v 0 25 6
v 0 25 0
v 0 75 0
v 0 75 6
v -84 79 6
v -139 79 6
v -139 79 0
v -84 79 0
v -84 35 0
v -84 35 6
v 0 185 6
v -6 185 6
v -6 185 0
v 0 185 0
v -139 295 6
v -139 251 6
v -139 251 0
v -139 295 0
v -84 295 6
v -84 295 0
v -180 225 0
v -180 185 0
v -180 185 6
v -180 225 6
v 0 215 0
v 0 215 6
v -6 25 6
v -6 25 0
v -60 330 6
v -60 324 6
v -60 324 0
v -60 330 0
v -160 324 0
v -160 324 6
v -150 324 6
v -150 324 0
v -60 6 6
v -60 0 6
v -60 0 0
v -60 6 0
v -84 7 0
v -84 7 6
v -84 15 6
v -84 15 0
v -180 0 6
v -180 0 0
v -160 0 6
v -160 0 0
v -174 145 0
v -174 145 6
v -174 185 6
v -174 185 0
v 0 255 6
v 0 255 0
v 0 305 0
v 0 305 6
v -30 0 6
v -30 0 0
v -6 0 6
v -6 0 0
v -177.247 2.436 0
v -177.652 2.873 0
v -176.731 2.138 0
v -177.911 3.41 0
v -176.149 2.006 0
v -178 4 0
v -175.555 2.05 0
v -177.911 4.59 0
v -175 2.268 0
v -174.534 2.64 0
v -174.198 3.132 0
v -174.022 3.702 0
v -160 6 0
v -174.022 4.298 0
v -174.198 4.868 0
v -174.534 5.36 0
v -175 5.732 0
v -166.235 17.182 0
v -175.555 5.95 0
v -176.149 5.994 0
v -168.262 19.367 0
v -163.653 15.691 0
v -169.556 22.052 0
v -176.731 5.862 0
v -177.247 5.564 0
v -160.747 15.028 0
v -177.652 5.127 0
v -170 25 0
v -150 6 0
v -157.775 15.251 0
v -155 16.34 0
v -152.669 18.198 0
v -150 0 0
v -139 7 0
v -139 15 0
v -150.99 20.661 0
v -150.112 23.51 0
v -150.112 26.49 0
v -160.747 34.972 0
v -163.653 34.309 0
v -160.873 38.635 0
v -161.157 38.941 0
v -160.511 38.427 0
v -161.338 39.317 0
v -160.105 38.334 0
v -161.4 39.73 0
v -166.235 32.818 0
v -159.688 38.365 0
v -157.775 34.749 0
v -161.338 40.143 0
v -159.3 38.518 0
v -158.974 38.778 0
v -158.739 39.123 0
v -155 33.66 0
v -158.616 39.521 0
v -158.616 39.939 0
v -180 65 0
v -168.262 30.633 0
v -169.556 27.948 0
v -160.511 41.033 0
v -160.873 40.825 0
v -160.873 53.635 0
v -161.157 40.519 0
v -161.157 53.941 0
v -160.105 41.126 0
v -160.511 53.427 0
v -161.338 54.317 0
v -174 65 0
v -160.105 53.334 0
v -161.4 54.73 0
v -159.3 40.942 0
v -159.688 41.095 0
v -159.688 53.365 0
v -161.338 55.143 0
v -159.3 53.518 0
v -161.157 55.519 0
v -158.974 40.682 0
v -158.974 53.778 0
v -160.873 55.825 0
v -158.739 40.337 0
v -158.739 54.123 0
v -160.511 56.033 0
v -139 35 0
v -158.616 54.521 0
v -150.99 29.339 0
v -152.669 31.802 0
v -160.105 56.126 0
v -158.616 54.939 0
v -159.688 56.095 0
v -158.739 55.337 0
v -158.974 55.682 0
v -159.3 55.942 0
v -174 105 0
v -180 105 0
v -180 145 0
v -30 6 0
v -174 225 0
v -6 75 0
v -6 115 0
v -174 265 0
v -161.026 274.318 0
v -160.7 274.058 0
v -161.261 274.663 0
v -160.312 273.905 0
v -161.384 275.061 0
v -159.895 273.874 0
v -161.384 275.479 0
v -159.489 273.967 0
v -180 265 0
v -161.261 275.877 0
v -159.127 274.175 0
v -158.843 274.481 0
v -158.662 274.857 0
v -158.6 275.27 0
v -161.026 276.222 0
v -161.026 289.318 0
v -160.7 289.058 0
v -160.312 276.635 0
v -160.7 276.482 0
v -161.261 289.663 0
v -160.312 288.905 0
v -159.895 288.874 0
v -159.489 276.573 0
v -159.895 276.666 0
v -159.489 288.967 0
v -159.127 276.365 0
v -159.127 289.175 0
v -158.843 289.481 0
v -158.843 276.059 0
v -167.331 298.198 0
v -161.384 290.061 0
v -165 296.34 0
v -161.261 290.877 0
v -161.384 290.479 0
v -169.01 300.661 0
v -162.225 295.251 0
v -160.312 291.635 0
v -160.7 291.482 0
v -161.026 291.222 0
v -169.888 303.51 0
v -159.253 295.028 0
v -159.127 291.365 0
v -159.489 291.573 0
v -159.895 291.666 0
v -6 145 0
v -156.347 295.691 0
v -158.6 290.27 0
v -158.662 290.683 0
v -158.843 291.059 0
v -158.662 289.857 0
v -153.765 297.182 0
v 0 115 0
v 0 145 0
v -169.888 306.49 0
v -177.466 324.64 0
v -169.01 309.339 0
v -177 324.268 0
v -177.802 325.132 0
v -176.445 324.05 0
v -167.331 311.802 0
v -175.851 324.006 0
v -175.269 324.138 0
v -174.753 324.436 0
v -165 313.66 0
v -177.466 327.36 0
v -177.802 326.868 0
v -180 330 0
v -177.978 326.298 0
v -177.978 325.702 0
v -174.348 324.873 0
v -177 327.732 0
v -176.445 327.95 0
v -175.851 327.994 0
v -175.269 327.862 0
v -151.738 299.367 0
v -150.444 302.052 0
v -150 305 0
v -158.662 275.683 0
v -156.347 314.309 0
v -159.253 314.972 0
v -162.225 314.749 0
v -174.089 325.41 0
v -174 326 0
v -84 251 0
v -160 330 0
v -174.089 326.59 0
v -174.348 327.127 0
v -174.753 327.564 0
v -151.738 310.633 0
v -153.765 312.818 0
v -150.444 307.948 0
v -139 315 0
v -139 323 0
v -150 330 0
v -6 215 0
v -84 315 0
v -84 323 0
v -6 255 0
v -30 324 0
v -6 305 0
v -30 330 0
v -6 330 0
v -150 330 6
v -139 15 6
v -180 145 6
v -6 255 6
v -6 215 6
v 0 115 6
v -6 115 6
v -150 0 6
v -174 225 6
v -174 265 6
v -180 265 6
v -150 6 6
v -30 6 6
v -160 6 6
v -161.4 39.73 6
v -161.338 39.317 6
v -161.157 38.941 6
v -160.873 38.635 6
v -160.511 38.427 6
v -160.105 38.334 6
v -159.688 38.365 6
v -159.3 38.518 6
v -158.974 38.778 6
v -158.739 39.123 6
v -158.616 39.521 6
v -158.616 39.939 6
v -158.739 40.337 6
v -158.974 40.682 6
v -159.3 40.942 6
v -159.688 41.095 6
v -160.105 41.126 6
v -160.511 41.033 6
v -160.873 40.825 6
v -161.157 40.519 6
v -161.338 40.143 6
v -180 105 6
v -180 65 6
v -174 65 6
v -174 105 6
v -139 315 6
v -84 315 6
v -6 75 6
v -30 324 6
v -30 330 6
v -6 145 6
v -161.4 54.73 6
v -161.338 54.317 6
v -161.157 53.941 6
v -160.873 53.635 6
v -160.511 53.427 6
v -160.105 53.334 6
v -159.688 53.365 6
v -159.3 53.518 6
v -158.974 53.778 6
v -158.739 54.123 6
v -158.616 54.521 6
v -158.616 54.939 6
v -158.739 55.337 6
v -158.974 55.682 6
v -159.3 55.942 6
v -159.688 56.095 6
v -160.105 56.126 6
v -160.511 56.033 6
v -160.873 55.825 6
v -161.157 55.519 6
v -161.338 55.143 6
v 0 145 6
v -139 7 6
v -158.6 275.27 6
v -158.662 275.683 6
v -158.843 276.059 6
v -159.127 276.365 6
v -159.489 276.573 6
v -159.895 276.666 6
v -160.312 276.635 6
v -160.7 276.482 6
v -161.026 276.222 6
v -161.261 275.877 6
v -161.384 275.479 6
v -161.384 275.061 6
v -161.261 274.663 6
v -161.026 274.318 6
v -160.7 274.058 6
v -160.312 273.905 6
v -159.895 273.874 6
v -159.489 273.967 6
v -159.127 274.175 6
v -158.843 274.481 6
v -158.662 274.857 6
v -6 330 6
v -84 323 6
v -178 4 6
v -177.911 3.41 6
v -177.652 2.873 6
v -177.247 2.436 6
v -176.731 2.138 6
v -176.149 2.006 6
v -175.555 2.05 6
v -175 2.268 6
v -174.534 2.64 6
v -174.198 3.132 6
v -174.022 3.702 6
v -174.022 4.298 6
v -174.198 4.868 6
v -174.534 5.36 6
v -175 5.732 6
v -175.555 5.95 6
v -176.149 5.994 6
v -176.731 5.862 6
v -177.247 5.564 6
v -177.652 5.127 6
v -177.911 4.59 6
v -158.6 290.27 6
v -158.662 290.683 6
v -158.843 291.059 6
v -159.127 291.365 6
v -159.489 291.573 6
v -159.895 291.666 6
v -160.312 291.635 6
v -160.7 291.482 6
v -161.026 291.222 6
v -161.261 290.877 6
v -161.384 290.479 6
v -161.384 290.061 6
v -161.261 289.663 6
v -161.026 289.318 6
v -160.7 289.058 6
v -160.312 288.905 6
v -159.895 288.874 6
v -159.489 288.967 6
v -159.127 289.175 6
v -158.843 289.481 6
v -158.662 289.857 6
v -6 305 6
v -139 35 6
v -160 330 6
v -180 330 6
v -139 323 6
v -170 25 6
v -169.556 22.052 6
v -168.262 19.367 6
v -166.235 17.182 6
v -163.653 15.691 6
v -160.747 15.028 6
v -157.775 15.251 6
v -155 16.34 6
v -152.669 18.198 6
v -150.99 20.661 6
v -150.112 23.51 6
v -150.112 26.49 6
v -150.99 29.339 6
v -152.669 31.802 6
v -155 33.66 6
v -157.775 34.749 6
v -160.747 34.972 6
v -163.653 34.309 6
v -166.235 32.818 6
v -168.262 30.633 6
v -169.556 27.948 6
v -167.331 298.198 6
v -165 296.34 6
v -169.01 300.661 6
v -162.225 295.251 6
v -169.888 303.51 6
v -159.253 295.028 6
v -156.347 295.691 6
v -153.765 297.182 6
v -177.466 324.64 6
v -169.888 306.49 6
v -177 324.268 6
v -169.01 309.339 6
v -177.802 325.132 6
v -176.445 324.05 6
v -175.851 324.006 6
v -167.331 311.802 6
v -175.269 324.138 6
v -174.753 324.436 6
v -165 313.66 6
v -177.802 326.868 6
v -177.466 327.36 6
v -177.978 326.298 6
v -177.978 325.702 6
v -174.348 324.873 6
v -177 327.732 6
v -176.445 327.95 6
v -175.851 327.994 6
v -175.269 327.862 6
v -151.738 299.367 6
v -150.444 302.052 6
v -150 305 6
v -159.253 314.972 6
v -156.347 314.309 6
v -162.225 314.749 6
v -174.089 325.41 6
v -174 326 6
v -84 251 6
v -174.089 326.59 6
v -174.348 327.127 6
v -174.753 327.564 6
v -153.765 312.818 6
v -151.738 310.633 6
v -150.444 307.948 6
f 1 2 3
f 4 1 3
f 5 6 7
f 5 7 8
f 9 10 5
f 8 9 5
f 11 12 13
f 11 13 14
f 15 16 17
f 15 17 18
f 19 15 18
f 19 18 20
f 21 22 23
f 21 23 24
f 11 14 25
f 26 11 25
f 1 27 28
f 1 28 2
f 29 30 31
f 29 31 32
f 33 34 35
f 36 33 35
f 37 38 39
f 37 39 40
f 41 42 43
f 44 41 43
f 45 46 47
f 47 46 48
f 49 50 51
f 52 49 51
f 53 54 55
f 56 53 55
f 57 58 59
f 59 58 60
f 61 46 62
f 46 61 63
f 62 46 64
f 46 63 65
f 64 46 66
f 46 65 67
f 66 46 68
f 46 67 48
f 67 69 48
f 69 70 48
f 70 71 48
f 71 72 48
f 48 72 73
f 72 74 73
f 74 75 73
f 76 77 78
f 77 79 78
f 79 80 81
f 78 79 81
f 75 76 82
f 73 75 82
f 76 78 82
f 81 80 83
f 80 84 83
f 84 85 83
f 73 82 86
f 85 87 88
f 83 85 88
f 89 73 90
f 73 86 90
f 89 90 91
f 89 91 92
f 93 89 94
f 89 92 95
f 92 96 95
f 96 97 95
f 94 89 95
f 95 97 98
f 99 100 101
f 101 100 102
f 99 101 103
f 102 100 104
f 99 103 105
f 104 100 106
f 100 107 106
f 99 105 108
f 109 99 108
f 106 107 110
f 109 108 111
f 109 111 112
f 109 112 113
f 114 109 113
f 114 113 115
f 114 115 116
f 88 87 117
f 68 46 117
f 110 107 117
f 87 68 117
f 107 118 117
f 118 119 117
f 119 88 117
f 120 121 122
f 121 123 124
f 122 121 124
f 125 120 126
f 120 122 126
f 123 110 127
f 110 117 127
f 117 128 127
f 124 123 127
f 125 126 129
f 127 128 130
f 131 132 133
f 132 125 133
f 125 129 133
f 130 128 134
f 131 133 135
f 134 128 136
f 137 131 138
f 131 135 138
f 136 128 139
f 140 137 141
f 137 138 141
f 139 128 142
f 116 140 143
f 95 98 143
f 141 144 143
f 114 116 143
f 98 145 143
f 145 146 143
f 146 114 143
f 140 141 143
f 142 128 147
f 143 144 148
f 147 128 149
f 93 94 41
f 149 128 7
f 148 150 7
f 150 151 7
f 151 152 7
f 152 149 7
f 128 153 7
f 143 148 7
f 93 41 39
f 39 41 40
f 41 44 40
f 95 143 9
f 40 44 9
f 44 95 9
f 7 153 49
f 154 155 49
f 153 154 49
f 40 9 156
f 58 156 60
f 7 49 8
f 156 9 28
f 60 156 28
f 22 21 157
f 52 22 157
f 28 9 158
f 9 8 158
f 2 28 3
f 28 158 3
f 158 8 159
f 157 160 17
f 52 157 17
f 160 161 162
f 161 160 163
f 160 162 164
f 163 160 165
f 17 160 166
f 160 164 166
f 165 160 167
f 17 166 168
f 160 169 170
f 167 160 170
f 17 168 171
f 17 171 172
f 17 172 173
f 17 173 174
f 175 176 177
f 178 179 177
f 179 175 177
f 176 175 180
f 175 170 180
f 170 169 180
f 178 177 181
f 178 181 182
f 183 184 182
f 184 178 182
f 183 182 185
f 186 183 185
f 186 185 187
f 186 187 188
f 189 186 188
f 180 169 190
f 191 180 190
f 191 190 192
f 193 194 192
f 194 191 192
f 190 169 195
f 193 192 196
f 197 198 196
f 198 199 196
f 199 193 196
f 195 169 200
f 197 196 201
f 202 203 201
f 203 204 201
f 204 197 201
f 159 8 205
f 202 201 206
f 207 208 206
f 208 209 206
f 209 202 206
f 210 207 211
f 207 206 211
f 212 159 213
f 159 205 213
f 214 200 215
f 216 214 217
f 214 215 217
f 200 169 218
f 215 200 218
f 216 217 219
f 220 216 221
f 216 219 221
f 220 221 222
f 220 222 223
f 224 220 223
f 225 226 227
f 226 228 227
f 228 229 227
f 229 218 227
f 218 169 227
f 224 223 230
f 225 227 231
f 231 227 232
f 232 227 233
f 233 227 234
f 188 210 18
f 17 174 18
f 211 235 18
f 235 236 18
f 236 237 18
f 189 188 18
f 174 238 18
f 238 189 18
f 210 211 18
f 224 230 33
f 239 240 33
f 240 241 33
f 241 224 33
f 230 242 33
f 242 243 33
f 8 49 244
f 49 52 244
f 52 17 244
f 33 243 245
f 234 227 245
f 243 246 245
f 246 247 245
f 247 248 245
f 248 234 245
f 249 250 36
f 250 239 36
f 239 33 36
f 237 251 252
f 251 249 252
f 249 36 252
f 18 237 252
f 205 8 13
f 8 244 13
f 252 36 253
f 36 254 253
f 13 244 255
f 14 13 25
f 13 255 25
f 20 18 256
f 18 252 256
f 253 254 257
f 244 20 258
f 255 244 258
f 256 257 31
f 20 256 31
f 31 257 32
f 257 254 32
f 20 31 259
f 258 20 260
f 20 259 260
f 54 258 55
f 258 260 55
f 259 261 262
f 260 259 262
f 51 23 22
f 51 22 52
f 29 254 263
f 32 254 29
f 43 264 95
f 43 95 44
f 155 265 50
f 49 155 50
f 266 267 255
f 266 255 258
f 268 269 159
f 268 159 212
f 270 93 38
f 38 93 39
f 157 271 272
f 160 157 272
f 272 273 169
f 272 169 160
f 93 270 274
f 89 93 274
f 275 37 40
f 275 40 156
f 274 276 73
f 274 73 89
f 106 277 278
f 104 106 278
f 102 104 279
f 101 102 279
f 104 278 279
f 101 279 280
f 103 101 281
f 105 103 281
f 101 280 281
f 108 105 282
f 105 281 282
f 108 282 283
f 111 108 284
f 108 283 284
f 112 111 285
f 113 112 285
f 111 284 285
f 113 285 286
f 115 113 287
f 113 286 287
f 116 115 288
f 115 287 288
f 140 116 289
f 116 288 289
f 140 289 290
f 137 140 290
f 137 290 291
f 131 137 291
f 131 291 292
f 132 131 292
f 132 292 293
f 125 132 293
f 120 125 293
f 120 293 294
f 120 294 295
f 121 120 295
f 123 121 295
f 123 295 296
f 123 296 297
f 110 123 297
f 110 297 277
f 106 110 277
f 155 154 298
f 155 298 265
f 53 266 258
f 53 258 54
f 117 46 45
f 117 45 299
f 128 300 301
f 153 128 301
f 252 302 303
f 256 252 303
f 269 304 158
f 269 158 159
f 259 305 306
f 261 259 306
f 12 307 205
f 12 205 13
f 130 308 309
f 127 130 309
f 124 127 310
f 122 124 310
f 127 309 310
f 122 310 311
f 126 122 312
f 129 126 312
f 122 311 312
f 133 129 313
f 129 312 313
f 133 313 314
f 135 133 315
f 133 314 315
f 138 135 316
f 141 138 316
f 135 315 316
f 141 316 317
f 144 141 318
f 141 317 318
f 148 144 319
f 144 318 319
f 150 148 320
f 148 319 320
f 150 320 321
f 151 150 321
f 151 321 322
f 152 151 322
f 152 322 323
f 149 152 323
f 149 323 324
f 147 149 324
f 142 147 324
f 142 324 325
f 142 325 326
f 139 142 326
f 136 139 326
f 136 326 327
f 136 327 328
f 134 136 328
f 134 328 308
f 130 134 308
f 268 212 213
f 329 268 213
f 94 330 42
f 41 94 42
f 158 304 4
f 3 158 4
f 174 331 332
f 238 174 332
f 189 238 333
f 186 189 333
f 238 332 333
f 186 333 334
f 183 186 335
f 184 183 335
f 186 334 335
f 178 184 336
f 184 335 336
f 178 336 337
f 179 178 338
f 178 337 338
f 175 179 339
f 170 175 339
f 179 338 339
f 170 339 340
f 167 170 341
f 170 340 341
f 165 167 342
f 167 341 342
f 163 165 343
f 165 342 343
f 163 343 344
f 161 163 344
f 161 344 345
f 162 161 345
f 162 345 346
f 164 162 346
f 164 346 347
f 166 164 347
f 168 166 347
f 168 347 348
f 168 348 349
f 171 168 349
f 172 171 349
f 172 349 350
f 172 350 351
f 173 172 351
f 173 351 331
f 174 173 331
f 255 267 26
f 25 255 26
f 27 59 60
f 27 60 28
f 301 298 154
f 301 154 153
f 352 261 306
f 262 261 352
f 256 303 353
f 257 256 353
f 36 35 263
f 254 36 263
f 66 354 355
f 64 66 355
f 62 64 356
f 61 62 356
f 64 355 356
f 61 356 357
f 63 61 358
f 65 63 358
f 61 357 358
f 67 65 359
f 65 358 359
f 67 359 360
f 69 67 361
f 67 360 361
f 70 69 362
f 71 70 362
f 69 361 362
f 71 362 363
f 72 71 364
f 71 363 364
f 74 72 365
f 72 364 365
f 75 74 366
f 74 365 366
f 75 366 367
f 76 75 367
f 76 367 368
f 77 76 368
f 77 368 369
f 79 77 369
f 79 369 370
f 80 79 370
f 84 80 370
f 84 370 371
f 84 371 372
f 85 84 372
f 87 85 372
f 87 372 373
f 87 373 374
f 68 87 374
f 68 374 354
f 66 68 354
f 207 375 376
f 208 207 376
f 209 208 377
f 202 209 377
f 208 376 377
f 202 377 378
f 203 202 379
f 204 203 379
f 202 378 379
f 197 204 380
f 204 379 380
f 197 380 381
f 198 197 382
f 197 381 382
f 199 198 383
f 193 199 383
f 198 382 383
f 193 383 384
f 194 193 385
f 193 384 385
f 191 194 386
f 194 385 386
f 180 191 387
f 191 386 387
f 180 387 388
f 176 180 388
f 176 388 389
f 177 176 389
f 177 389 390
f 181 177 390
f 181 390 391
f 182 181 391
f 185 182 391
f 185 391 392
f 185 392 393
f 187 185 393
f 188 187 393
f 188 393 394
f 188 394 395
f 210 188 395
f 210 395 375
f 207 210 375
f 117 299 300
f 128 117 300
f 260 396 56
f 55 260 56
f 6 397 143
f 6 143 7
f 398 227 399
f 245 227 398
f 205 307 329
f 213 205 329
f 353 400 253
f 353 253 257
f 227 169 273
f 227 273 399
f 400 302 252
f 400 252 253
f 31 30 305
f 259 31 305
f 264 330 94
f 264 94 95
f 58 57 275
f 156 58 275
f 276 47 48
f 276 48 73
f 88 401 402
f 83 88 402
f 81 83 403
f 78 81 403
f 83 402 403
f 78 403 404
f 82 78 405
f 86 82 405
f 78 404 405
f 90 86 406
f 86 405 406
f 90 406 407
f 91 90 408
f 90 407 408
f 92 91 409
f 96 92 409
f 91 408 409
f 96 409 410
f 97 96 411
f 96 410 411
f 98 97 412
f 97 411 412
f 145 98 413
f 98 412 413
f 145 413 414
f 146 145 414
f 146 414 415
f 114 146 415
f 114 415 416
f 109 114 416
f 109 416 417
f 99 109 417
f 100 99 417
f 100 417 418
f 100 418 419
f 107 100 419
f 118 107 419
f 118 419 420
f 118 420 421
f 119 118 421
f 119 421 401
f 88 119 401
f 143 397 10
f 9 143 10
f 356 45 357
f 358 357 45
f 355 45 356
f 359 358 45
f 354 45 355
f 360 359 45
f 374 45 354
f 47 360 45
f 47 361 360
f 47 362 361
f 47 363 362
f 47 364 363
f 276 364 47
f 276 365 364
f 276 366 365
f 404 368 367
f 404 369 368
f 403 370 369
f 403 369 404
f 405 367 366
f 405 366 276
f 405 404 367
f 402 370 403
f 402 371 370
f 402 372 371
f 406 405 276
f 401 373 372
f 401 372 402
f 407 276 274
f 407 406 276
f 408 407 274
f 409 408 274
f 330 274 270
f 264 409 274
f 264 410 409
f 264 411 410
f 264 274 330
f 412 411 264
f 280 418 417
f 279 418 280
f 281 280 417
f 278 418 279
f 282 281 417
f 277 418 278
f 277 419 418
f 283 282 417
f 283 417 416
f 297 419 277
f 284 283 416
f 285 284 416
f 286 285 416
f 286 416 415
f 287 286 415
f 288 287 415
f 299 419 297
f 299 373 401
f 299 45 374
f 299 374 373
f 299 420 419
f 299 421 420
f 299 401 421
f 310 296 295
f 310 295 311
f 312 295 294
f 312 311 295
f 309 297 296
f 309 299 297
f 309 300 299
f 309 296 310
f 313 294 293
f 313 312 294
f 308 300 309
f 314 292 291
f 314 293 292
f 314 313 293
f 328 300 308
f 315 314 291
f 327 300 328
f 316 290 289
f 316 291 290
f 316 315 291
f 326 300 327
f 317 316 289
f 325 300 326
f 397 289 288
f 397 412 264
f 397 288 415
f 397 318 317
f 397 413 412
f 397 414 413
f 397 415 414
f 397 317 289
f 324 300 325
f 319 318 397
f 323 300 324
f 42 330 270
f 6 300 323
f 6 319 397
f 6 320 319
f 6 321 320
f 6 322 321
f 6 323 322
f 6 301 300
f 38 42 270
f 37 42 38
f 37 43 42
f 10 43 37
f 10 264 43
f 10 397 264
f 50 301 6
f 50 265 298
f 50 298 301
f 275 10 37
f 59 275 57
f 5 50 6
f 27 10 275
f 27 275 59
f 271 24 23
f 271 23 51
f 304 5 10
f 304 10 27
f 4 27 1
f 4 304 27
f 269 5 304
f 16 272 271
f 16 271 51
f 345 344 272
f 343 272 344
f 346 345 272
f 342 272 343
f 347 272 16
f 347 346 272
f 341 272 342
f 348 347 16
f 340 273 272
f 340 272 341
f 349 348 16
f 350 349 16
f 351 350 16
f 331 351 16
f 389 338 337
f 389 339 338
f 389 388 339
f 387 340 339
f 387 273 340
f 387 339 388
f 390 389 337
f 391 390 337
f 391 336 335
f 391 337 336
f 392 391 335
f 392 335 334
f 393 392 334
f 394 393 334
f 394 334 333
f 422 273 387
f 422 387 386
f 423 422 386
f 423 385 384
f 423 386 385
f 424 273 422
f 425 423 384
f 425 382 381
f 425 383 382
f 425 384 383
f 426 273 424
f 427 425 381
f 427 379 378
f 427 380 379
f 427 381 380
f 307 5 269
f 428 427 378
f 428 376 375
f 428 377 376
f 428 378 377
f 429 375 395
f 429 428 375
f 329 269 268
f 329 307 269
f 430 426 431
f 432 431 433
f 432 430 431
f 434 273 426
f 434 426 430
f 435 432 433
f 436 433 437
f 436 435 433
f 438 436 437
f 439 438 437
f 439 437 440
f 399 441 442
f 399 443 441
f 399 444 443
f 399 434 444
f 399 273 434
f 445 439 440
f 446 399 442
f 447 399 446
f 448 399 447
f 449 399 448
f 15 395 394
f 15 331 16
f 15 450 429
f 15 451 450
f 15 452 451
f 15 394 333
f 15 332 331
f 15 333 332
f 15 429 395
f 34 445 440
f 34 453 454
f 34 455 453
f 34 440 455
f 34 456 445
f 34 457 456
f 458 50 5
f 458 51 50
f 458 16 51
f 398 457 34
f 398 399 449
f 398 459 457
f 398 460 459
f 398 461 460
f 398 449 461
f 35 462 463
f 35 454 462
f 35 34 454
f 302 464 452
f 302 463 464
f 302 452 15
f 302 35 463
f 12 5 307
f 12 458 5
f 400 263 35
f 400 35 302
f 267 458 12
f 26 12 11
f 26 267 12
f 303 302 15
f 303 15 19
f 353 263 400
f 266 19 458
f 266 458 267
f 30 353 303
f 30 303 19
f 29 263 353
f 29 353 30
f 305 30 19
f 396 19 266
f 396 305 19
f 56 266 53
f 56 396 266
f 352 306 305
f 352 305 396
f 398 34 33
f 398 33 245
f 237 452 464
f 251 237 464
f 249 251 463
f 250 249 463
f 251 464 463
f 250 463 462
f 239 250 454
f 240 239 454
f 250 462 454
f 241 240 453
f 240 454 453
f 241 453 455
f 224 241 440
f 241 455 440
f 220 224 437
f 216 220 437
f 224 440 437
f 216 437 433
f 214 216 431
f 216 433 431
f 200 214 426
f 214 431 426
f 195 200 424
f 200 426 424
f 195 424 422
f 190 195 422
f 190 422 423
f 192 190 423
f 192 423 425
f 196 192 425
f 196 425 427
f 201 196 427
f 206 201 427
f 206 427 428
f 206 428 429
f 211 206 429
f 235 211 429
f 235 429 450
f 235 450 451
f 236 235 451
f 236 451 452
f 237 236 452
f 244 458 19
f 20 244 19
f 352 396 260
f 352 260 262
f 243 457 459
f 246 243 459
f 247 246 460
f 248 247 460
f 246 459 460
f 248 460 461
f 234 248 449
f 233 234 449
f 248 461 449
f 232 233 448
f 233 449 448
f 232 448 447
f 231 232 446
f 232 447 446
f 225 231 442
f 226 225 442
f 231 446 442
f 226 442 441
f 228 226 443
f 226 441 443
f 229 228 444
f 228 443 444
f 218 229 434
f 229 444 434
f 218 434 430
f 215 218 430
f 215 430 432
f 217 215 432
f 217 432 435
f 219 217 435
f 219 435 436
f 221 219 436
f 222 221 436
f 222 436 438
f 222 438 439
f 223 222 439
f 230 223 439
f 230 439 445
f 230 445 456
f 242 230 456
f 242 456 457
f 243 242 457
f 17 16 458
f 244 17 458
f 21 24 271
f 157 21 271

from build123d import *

# Parameters (mm, degrees)
ESQUISSE1_W                       = 180
ESQUISSE1_H                       = 330
BOSS_EXTRU_1_DEPTH                = 6
ESQUISSE2_R                       = 2
ESQUISSE2_R_2                     = 10
ESQUISSE2_R_3                     = 1.4
ESQUISSE2_W                       = 55
ESQUISSE2_H                       = 8
ESQUISSE2_H_2                     = 44
ENL_V_MAT_BLOC_MOTEUR_BILLE_DEPTH = 376.946804748
ESQUISSE3_W                       = 6
ESQUISSE3_H                       = 25
ESQUISSE3_W_2                     = 10
ESQUISSE3_H_2                     = 6
ESQUISSE3_W_3                     = 30
ESQUISSE3_H_3                     = 40
ENL_V_MAT_ENCOCHE_DEPTH           = 376.946804748


with BuildPart() as part:
    # Esquisse1 → Boss.-Extru.1 (new body)
    with BuildSketch(Plane.XY):
        with Locations((-90, 165)):
            Rectangle(ESQUISSE1_W, ESQUISSE1_H)
    extrude(amount=BOSS_EXTRU_1_DEPTH)

    # Esquisse2 → Enlèv. mat bloc moteur + bille (cut, through all)
    with BuildSketch(Plane.XY.offset(6)):
        with Locations((-176, 326)):
            Circle(ESQUISSE2_R)
        with Locations((-160, 305)):
            Circle(ESQUISSE2_R_2)
        with Locations((-160, 290.27)):
            Circle(ESQUISSE2_R_3)
        with Locations((-160, 275.27)):
            Circle(ESQUISSE2_R_3)
        with Locations(Location((-160, 54.73, 0), (0, 0, 180))):
            Circle(ESQUISSE2_R_3)
        with Locations(Location((-160, 39.73, 0), (0, 0, 180))):
            Circle(ESQUISSE2_R_3)
        with Locations(Location((-160, 25, 0), (0, 0, 180))):
            Circle(ESQUISSE2_R_2)
        with Locations(Location((-176, 4, 0), (0, 0, 180))):
            Circle(ESQUISSE2_R)
        with Locations((-111.5, 319)):
            Rectangle(ESQUISSE2_W, ESQUISSE2_H)
        with Locations((-111.5, 273)):
            Rectangle(ESQUISSE2_W, ESQUISSE2_H_2)
        with Locations((-111.5, 11)):
            Rectangle(ESQUISSE2_W, ESQUISSE2_H)
        with Locations((-111.5, 57)):
            Rectangle(ESQUISSE2_W, ESQUISSE2_H_2)
    extrude(amount=-ENL_V_MAT_BLOC_MOTEUR_BILLE_DEPTH, mode=Mode.SUBTRACT)

    # Esquisse3 → Enlèv. mat encoche (cut, through all)
    with BuildSketch(Plane.XY.offset(6)):
        with Locations((-3, 317.5)):
            Rectangle(ESQUISSE3_W, ESQUISSE3_H)
        with Locations((-155, 3)):
            Rectangle(ESQUISSE3_W_2, ESQUISSE3_H_2)
        with Locations((-45, 3)):
            Rectangle(ESQUISSE3_W_3, ESQUISSE3_H_2)
        with Locations((-177, 165)):
            Rectangle(ESQUISSE3_W, ESQUISSE3_H_3)
        with Locations((-177, 85)):
            Rectangle(ESQUISSE3_W, ESQUISSE3_H_3)
        with Locations((-155, 327)):
            Rectangle(ESQUISSE3_W_2, ESQUISSE3_H_2)
        with Locations((-45, 327)):
            Rectangle(ESQUISSE3_W_3, ESQUISSE3_H_2)
        with Locations((-177, 245)):
            Rectangle(ESQUISSE3_W, ESQUISSE3_H_3)
        with Locations((-3, 235)):
            Rectangle(ESQUISSE3_W, ESQUISSE3_H_3)
        with Locations((-3, 165)):
            Rectangle(ESQUISSE3_W, ESQUISSE3_H_3)
        with Locations((-3, 95)):
            Rectangle(ESQUISSE3_W, ESQUISSE3_H_3)
        with Locations((-3, 12.5)):
            Rectangle(ESQUISSE3_W, ESQUISSE3_H)
    extrude(amount=-ENL_V_MAT_ENCOCHE_DEPTH, mode=Mode.SUBTRACT)


solid = part.part
